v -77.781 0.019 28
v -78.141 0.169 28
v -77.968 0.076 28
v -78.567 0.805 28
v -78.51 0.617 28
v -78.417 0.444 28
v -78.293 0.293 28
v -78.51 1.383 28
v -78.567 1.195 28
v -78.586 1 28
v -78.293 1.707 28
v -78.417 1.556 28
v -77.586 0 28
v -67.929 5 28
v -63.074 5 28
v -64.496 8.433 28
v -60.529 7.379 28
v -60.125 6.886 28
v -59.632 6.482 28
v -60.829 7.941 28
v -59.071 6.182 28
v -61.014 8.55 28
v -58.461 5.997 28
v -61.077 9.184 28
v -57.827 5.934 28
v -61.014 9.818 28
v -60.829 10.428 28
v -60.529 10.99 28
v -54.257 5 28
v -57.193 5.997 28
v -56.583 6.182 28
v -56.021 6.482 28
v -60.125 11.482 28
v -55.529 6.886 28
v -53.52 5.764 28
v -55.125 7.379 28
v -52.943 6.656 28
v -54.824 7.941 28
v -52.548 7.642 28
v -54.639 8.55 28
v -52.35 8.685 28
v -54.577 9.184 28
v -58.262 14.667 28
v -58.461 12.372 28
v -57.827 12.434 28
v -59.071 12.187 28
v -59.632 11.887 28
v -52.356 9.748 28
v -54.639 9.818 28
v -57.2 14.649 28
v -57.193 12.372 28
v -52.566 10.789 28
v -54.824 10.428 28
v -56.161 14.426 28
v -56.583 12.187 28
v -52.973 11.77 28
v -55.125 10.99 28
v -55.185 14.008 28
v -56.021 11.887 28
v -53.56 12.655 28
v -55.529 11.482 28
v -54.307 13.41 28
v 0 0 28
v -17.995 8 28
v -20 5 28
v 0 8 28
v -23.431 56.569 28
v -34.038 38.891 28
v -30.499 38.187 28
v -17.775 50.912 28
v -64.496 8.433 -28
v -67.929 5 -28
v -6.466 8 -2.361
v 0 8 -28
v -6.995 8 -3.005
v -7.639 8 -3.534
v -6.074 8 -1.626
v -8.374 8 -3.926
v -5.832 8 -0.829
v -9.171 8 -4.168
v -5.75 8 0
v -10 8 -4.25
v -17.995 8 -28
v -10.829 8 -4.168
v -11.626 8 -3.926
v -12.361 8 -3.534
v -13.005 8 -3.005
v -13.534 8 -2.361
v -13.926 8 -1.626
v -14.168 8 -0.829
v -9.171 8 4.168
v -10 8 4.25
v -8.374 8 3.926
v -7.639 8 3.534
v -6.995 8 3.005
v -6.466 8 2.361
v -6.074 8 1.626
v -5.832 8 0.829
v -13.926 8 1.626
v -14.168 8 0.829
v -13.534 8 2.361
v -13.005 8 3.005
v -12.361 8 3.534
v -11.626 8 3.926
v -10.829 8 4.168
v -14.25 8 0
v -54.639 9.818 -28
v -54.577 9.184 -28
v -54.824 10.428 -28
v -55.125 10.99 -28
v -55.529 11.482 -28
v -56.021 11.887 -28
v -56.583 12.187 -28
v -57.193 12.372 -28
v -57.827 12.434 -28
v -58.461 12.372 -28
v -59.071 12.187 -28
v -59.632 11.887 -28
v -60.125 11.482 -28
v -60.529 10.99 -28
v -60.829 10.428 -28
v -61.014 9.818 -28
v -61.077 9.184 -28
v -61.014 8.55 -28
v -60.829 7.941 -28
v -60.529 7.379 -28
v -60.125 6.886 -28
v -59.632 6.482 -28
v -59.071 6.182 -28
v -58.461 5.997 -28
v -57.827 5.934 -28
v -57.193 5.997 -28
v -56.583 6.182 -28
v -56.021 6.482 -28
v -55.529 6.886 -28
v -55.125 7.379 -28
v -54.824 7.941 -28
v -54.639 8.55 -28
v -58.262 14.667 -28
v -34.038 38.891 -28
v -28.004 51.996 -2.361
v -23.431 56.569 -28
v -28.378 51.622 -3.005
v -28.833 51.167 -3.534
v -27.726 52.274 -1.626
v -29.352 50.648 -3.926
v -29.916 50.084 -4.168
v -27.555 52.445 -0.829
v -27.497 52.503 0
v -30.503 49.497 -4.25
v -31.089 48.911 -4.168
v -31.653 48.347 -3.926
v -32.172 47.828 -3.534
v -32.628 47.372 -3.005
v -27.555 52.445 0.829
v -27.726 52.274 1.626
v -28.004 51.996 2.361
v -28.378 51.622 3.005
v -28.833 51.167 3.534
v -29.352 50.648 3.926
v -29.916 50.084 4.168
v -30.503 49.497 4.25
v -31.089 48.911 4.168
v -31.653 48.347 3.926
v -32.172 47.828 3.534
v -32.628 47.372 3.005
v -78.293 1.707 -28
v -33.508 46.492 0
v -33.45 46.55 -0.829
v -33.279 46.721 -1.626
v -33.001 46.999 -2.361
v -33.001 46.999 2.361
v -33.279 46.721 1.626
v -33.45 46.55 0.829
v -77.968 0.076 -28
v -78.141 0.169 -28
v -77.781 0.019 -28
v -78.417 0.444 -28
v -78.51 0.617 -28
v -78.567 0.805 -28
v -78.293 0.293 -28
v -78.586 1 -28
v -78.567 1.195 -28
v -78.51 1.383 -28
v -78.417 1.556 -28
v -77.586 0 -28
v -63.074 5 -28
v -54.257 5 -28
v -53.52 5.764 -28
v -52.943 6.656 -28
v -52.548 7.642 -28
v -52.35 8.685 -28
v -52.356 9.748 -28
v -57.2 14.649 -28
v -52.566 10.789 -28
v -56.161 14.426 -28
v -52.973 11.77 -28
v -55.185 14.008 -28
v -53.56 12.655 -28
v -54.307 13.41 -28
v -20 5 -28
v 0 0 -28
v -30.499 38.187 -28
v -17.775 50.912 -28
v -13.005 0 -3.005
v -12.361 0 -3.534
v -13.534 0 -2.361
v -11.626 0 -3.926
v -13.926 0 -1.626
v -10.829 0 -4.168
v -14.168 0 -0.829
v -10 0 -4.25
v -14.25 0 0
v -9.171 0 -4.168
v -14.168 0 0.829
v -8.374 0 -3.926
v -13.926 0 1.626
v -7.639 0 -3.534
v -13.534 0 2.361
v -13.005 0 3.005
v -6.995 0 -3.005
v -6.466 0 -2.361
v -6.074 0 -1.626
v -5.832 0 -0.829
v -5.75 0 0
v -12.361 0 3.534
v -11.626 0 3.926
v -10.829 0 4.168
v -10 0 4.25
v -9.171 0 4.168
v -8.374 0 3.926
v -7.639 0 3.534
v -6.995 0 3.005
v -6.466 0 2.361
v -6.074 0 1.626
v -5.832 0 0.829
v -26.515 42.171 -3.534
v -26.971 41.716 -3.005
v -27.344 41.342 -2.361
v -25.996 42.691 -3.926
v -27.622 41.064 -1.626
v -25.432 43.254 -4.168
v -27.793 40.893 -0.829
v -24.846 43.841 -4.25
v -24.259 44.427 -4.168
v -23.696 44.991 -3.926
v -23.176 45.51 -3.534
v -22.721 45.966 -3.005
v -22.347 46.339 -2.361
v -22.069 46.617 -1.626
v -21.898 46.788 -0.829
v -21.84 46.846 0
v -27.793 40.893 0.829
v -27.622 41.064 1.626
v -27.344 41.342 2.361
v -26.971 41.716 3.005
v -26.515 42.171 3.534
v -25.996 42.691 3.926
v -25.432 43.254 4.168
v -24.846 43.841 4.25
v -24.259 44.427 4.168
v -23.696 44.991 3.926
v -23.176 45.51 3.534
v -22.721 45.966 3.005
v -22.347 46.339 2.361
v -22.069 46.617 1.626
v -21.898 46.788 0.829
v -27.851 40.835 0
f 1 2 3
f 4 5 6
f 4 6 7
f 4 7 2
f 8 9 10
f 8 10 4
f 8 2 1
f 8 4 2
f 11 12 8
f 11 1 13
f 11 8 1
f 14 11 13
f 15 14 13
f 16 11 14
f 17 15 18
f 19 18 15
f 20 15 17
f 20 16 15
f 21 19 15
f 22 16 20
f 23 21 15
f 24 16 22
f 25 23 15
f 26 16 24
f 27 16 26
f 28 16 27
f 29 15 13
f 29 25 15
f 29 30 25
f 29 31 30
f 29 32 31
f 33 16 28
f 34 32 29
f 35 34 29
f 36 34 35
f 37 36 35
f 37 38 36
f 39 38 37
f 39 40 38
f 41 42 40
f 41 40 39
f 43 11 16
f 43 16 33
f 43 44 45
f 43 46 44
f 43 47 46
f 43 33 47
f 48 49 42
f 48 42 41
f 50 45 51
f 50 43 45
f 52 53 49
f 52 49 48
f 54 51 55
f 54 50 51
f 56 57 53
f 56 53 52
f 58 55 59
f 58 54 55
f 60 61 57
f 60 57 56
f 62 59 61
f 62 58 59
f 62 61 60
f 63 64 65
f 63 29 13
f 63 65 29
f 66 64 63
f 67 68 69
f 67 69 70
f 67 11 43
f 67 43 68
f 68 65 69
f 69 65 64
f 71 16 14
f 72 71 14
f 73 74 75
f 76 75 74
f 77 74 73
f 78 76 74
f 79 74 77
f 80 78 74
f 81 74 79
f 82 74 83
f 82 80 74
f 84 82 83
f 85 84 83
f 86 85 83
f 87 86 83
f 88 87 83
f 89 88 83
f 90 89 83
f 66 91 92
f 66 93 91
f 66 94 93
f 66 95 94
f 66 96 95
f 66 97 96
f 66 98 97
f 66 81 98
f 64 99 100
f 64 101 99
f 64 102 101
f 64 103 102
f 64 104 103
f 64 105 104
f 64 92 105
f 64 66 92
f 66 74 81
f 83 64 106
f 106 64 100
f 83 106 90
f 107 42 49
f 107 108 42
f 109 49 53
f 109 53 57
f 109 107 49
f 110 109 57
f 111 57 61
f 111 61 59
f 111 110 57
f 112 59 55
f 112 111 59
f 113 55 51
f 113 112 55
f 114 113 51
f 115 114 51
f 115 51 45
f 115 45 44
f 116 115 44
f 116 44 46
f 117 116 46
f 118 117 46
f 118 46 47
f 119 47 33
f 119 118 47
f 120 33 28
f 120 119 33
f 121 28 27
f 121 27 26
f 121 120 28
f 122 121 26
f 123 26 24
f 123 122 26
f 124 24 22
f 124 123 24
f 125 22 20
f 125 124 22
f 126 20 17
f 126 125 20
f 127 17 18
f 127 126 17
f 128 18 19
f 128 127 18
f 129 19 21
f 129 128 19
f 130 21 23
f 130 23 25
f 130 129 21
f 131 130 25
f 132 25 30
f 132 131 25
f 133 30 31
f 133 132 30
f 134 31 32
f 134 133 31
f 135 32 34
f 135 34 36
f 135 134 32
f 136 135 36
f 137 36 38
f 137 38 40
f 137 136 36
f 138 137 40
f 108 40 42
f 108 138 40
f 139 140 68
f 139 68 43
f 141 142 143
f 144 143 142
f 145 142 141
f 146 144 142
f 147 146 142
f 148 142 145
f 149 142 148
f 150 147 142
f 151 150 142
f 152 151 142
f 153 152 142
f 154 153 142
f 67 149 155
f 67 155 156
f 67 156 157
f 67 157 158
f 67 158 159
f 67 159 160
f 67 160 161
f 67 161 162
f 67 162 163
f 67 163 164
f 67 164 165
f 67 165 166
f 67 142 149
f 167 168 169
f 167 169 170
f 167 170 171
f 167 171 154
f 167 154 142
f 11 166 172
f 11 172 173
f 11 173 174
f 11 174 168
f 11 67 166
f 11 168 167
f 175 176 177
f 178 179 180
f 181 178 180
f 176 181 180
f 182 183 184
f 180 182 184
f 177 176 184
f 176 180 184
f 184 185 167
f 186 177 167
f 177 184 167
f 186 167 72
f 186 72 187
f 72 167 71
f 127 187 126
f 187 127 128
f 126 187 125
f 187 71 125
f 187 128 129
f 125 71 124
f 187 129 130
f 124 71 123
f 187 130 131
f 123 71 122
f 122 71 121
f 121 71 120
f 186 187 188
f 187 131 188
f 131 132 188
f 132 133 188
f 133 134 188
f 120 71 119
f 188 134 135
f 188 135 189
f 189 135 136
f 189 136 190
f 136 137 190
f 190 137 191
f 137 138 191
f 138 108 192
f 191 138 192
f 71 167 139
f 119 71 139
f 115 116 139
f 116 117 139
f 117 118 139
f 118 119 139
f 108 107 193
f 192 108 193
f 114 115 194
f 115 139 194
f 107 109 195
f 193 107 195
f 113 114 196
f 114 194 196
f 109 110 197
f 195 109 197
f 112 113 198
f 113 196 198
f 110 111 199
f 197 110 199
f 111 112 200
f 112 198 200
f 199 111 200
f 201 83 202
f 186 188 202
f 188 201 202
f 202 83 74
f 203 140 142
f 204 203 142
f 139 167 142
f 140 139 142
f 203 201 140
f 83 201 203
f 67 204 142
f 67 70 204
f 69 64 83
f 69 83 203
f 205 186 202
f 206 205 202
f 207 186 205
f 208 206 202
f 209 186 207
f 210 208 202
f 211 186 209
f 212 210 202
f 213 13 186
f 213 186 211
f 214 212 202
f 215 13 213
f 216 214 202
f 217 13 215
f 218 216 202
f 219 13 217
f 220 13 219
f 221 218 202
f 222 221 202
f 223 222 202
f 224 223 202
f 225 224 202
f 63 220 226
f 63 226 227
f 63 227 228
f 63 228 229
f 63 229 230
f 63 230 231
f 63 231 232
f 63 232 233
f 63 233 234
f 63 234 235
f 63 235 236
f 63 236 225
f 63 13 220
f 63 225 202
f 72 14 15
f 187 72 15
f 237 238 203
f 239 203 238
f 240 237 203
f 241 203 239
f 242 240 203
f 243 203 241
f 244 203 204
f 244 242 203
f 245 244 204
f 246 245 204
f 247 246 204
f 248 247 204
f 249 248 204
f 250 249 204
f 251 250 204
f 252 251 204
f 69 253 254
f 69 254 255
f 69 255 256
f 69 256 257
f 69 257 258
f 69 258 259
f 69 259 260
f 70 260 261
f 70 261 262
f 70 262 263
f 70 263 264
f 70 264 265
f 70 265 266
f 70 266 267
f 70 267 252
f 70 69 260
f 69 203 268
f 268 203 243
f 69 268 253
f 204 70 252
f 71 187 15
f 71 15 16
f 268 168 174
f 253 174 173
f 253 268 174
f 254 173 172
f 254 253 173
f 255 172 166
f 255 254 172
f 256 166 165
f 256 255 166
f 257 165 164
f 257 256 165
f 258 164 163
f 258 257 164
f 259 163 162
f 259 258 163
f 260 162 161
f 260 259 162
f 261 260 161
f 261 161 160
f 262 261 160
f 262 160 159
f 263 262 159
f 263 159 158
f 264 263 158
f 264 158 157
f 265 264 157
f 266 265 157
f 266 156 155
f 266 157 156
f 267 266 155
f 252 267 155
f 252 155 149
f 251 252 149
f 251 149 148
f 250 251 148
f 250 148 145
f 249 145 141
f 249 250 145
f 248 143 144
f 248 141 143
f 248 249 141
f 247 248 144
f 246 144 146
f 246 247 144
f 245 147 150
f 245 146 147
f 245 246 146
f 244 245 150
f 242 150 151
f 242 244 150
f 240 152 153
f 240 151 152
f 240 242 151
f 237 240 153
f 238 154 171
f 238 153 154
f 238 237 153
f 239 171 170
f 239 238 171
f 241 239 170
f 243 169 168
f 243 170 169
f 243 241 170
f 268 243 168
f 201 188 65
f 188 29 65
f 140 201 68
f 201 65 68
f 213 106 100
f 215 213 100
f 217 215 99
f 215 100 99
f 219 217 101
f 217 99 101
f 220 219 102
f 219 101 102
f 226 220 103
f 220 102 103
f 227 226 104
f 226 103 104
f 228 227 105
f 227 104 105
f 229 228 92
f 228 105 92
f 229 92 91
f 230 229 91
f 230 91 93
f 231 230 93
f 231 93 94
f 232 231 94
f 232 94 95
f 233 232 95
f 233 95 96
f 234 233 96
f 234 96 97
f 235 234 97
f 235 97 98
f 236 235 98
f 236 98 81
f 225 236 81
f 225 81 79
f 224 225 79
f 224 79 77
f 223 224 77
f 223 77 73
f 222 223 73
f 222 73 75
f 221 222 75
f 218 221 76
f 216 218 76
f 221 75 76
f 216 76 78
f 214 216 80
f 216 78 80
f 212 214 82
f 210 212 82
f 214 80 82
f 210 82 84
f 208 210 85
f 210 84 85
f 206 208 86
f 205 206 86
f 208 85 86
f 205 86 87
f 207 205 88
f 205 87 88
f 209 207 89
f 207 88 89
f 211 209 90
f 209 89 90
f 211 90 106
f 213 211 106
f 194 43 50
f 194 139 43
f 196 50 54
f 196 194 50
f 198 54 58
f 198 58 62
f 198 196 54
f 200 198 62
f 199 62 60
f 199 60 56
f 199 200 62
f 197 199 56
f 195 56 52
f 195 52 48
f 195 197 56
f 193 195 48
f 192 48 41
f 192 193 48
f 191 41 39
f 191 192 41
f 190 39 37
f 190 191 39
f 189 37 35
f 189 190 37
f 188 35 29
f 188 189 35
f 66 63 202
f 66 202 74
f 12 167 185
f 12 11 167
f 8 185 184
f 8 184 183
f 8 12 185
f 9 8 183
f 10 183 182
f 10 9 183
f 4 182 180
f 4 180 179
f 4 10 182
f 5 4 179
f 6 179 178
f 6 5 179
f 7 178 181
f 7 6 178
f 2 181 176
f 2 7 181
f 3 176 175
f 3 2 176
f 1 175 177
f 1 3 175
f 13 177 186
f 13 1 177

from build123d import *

# Parameters (mm, degrees)
SKETCH_1_R          = 3.25
EXTRUDE_1_DEPTH     = 28
SKETCH_3_R          = 4.25
CUT_EXTRUDE_1_DEPTH = 17


with BuildPart() as part:
    # 草图1 → 凸台-拉伸1 (new, symmetric)
    with BuildSketch(Plane.XY):
        with BuildLine():
            Line((-77.585786438, 0), (0, 0))
            Line((0, 0), (0, 8))
            Line((0, 8), (-17.995464086, 8))
            Line((-17.995464086, 8), (-30.499317942, 38.186973559))
            Line((-30.499317942, 38.186973559), (-17.774603256, 50.911688245))
            Line((-17.774603256, 50.911688245), (-23.431457505, 56.568542495))
            Line((-23.431457505, 56.568542495), (-78.292893219, 1.707106781))
            ThreePointArc((-78.292893219, 1.707106781), (-78.50966597, 0.617316568), (-77.585786438, 0))
        make_face()
        with Locations((-57.82689122, 9.184402377)):
            Circle(SKETCH_1_R, mode=Mode.SUBTRACT)
        Polygon((-67.928932188, 5), (-63.07447047, 5), (-64.496309389, 8.4326228), align=None, mode=Mode.SUBTRACT)
        with BuildLine():
            Line((-54.257468753, 5), (-20, 5))
            Line((-20, 5), (-34.038059223, 38.890872965))
            Line((-34.038059223, 38.890872965), (-58.261747684, 14.667184504))
            ThreePointArc((-58.261747684, 14.667184504), (-52.745553791, 11.289161255), (-54.257468753, 5))
        make_face(mode=Mode.SUBTRACT)
    extrude(amount=EXTRUDE_1_DEPTH, both=True)

    # 草图3 → 切除-拉伸1 (cut)
    with BuildSketch(Plane(origin=(0, 8, 0), x_dir=(1, 0, 0), z_dir=(0, 1, 0))):
        with Locations(Location((-10, 0, 0), (0, 0, 180))):
            Circle(SKETCH_3_R)
    cut_extrude_1 = extrude(amount=-CUT_EXTRUDE_1_DEPTH, mode=Mode.SUBTRACT)

    # 镜向1: 切除-拉伸1 across plane
    add(cut_extrude_1.mirror(Plane(origin=(-11.715728753, 28.284271247, 0), x_dir=(0, 0, 1), z_dir=(-0.3826834323650881, 0.9238795325112875, 0))), mode=Mode.SUBTRACT)


solid = part.part
